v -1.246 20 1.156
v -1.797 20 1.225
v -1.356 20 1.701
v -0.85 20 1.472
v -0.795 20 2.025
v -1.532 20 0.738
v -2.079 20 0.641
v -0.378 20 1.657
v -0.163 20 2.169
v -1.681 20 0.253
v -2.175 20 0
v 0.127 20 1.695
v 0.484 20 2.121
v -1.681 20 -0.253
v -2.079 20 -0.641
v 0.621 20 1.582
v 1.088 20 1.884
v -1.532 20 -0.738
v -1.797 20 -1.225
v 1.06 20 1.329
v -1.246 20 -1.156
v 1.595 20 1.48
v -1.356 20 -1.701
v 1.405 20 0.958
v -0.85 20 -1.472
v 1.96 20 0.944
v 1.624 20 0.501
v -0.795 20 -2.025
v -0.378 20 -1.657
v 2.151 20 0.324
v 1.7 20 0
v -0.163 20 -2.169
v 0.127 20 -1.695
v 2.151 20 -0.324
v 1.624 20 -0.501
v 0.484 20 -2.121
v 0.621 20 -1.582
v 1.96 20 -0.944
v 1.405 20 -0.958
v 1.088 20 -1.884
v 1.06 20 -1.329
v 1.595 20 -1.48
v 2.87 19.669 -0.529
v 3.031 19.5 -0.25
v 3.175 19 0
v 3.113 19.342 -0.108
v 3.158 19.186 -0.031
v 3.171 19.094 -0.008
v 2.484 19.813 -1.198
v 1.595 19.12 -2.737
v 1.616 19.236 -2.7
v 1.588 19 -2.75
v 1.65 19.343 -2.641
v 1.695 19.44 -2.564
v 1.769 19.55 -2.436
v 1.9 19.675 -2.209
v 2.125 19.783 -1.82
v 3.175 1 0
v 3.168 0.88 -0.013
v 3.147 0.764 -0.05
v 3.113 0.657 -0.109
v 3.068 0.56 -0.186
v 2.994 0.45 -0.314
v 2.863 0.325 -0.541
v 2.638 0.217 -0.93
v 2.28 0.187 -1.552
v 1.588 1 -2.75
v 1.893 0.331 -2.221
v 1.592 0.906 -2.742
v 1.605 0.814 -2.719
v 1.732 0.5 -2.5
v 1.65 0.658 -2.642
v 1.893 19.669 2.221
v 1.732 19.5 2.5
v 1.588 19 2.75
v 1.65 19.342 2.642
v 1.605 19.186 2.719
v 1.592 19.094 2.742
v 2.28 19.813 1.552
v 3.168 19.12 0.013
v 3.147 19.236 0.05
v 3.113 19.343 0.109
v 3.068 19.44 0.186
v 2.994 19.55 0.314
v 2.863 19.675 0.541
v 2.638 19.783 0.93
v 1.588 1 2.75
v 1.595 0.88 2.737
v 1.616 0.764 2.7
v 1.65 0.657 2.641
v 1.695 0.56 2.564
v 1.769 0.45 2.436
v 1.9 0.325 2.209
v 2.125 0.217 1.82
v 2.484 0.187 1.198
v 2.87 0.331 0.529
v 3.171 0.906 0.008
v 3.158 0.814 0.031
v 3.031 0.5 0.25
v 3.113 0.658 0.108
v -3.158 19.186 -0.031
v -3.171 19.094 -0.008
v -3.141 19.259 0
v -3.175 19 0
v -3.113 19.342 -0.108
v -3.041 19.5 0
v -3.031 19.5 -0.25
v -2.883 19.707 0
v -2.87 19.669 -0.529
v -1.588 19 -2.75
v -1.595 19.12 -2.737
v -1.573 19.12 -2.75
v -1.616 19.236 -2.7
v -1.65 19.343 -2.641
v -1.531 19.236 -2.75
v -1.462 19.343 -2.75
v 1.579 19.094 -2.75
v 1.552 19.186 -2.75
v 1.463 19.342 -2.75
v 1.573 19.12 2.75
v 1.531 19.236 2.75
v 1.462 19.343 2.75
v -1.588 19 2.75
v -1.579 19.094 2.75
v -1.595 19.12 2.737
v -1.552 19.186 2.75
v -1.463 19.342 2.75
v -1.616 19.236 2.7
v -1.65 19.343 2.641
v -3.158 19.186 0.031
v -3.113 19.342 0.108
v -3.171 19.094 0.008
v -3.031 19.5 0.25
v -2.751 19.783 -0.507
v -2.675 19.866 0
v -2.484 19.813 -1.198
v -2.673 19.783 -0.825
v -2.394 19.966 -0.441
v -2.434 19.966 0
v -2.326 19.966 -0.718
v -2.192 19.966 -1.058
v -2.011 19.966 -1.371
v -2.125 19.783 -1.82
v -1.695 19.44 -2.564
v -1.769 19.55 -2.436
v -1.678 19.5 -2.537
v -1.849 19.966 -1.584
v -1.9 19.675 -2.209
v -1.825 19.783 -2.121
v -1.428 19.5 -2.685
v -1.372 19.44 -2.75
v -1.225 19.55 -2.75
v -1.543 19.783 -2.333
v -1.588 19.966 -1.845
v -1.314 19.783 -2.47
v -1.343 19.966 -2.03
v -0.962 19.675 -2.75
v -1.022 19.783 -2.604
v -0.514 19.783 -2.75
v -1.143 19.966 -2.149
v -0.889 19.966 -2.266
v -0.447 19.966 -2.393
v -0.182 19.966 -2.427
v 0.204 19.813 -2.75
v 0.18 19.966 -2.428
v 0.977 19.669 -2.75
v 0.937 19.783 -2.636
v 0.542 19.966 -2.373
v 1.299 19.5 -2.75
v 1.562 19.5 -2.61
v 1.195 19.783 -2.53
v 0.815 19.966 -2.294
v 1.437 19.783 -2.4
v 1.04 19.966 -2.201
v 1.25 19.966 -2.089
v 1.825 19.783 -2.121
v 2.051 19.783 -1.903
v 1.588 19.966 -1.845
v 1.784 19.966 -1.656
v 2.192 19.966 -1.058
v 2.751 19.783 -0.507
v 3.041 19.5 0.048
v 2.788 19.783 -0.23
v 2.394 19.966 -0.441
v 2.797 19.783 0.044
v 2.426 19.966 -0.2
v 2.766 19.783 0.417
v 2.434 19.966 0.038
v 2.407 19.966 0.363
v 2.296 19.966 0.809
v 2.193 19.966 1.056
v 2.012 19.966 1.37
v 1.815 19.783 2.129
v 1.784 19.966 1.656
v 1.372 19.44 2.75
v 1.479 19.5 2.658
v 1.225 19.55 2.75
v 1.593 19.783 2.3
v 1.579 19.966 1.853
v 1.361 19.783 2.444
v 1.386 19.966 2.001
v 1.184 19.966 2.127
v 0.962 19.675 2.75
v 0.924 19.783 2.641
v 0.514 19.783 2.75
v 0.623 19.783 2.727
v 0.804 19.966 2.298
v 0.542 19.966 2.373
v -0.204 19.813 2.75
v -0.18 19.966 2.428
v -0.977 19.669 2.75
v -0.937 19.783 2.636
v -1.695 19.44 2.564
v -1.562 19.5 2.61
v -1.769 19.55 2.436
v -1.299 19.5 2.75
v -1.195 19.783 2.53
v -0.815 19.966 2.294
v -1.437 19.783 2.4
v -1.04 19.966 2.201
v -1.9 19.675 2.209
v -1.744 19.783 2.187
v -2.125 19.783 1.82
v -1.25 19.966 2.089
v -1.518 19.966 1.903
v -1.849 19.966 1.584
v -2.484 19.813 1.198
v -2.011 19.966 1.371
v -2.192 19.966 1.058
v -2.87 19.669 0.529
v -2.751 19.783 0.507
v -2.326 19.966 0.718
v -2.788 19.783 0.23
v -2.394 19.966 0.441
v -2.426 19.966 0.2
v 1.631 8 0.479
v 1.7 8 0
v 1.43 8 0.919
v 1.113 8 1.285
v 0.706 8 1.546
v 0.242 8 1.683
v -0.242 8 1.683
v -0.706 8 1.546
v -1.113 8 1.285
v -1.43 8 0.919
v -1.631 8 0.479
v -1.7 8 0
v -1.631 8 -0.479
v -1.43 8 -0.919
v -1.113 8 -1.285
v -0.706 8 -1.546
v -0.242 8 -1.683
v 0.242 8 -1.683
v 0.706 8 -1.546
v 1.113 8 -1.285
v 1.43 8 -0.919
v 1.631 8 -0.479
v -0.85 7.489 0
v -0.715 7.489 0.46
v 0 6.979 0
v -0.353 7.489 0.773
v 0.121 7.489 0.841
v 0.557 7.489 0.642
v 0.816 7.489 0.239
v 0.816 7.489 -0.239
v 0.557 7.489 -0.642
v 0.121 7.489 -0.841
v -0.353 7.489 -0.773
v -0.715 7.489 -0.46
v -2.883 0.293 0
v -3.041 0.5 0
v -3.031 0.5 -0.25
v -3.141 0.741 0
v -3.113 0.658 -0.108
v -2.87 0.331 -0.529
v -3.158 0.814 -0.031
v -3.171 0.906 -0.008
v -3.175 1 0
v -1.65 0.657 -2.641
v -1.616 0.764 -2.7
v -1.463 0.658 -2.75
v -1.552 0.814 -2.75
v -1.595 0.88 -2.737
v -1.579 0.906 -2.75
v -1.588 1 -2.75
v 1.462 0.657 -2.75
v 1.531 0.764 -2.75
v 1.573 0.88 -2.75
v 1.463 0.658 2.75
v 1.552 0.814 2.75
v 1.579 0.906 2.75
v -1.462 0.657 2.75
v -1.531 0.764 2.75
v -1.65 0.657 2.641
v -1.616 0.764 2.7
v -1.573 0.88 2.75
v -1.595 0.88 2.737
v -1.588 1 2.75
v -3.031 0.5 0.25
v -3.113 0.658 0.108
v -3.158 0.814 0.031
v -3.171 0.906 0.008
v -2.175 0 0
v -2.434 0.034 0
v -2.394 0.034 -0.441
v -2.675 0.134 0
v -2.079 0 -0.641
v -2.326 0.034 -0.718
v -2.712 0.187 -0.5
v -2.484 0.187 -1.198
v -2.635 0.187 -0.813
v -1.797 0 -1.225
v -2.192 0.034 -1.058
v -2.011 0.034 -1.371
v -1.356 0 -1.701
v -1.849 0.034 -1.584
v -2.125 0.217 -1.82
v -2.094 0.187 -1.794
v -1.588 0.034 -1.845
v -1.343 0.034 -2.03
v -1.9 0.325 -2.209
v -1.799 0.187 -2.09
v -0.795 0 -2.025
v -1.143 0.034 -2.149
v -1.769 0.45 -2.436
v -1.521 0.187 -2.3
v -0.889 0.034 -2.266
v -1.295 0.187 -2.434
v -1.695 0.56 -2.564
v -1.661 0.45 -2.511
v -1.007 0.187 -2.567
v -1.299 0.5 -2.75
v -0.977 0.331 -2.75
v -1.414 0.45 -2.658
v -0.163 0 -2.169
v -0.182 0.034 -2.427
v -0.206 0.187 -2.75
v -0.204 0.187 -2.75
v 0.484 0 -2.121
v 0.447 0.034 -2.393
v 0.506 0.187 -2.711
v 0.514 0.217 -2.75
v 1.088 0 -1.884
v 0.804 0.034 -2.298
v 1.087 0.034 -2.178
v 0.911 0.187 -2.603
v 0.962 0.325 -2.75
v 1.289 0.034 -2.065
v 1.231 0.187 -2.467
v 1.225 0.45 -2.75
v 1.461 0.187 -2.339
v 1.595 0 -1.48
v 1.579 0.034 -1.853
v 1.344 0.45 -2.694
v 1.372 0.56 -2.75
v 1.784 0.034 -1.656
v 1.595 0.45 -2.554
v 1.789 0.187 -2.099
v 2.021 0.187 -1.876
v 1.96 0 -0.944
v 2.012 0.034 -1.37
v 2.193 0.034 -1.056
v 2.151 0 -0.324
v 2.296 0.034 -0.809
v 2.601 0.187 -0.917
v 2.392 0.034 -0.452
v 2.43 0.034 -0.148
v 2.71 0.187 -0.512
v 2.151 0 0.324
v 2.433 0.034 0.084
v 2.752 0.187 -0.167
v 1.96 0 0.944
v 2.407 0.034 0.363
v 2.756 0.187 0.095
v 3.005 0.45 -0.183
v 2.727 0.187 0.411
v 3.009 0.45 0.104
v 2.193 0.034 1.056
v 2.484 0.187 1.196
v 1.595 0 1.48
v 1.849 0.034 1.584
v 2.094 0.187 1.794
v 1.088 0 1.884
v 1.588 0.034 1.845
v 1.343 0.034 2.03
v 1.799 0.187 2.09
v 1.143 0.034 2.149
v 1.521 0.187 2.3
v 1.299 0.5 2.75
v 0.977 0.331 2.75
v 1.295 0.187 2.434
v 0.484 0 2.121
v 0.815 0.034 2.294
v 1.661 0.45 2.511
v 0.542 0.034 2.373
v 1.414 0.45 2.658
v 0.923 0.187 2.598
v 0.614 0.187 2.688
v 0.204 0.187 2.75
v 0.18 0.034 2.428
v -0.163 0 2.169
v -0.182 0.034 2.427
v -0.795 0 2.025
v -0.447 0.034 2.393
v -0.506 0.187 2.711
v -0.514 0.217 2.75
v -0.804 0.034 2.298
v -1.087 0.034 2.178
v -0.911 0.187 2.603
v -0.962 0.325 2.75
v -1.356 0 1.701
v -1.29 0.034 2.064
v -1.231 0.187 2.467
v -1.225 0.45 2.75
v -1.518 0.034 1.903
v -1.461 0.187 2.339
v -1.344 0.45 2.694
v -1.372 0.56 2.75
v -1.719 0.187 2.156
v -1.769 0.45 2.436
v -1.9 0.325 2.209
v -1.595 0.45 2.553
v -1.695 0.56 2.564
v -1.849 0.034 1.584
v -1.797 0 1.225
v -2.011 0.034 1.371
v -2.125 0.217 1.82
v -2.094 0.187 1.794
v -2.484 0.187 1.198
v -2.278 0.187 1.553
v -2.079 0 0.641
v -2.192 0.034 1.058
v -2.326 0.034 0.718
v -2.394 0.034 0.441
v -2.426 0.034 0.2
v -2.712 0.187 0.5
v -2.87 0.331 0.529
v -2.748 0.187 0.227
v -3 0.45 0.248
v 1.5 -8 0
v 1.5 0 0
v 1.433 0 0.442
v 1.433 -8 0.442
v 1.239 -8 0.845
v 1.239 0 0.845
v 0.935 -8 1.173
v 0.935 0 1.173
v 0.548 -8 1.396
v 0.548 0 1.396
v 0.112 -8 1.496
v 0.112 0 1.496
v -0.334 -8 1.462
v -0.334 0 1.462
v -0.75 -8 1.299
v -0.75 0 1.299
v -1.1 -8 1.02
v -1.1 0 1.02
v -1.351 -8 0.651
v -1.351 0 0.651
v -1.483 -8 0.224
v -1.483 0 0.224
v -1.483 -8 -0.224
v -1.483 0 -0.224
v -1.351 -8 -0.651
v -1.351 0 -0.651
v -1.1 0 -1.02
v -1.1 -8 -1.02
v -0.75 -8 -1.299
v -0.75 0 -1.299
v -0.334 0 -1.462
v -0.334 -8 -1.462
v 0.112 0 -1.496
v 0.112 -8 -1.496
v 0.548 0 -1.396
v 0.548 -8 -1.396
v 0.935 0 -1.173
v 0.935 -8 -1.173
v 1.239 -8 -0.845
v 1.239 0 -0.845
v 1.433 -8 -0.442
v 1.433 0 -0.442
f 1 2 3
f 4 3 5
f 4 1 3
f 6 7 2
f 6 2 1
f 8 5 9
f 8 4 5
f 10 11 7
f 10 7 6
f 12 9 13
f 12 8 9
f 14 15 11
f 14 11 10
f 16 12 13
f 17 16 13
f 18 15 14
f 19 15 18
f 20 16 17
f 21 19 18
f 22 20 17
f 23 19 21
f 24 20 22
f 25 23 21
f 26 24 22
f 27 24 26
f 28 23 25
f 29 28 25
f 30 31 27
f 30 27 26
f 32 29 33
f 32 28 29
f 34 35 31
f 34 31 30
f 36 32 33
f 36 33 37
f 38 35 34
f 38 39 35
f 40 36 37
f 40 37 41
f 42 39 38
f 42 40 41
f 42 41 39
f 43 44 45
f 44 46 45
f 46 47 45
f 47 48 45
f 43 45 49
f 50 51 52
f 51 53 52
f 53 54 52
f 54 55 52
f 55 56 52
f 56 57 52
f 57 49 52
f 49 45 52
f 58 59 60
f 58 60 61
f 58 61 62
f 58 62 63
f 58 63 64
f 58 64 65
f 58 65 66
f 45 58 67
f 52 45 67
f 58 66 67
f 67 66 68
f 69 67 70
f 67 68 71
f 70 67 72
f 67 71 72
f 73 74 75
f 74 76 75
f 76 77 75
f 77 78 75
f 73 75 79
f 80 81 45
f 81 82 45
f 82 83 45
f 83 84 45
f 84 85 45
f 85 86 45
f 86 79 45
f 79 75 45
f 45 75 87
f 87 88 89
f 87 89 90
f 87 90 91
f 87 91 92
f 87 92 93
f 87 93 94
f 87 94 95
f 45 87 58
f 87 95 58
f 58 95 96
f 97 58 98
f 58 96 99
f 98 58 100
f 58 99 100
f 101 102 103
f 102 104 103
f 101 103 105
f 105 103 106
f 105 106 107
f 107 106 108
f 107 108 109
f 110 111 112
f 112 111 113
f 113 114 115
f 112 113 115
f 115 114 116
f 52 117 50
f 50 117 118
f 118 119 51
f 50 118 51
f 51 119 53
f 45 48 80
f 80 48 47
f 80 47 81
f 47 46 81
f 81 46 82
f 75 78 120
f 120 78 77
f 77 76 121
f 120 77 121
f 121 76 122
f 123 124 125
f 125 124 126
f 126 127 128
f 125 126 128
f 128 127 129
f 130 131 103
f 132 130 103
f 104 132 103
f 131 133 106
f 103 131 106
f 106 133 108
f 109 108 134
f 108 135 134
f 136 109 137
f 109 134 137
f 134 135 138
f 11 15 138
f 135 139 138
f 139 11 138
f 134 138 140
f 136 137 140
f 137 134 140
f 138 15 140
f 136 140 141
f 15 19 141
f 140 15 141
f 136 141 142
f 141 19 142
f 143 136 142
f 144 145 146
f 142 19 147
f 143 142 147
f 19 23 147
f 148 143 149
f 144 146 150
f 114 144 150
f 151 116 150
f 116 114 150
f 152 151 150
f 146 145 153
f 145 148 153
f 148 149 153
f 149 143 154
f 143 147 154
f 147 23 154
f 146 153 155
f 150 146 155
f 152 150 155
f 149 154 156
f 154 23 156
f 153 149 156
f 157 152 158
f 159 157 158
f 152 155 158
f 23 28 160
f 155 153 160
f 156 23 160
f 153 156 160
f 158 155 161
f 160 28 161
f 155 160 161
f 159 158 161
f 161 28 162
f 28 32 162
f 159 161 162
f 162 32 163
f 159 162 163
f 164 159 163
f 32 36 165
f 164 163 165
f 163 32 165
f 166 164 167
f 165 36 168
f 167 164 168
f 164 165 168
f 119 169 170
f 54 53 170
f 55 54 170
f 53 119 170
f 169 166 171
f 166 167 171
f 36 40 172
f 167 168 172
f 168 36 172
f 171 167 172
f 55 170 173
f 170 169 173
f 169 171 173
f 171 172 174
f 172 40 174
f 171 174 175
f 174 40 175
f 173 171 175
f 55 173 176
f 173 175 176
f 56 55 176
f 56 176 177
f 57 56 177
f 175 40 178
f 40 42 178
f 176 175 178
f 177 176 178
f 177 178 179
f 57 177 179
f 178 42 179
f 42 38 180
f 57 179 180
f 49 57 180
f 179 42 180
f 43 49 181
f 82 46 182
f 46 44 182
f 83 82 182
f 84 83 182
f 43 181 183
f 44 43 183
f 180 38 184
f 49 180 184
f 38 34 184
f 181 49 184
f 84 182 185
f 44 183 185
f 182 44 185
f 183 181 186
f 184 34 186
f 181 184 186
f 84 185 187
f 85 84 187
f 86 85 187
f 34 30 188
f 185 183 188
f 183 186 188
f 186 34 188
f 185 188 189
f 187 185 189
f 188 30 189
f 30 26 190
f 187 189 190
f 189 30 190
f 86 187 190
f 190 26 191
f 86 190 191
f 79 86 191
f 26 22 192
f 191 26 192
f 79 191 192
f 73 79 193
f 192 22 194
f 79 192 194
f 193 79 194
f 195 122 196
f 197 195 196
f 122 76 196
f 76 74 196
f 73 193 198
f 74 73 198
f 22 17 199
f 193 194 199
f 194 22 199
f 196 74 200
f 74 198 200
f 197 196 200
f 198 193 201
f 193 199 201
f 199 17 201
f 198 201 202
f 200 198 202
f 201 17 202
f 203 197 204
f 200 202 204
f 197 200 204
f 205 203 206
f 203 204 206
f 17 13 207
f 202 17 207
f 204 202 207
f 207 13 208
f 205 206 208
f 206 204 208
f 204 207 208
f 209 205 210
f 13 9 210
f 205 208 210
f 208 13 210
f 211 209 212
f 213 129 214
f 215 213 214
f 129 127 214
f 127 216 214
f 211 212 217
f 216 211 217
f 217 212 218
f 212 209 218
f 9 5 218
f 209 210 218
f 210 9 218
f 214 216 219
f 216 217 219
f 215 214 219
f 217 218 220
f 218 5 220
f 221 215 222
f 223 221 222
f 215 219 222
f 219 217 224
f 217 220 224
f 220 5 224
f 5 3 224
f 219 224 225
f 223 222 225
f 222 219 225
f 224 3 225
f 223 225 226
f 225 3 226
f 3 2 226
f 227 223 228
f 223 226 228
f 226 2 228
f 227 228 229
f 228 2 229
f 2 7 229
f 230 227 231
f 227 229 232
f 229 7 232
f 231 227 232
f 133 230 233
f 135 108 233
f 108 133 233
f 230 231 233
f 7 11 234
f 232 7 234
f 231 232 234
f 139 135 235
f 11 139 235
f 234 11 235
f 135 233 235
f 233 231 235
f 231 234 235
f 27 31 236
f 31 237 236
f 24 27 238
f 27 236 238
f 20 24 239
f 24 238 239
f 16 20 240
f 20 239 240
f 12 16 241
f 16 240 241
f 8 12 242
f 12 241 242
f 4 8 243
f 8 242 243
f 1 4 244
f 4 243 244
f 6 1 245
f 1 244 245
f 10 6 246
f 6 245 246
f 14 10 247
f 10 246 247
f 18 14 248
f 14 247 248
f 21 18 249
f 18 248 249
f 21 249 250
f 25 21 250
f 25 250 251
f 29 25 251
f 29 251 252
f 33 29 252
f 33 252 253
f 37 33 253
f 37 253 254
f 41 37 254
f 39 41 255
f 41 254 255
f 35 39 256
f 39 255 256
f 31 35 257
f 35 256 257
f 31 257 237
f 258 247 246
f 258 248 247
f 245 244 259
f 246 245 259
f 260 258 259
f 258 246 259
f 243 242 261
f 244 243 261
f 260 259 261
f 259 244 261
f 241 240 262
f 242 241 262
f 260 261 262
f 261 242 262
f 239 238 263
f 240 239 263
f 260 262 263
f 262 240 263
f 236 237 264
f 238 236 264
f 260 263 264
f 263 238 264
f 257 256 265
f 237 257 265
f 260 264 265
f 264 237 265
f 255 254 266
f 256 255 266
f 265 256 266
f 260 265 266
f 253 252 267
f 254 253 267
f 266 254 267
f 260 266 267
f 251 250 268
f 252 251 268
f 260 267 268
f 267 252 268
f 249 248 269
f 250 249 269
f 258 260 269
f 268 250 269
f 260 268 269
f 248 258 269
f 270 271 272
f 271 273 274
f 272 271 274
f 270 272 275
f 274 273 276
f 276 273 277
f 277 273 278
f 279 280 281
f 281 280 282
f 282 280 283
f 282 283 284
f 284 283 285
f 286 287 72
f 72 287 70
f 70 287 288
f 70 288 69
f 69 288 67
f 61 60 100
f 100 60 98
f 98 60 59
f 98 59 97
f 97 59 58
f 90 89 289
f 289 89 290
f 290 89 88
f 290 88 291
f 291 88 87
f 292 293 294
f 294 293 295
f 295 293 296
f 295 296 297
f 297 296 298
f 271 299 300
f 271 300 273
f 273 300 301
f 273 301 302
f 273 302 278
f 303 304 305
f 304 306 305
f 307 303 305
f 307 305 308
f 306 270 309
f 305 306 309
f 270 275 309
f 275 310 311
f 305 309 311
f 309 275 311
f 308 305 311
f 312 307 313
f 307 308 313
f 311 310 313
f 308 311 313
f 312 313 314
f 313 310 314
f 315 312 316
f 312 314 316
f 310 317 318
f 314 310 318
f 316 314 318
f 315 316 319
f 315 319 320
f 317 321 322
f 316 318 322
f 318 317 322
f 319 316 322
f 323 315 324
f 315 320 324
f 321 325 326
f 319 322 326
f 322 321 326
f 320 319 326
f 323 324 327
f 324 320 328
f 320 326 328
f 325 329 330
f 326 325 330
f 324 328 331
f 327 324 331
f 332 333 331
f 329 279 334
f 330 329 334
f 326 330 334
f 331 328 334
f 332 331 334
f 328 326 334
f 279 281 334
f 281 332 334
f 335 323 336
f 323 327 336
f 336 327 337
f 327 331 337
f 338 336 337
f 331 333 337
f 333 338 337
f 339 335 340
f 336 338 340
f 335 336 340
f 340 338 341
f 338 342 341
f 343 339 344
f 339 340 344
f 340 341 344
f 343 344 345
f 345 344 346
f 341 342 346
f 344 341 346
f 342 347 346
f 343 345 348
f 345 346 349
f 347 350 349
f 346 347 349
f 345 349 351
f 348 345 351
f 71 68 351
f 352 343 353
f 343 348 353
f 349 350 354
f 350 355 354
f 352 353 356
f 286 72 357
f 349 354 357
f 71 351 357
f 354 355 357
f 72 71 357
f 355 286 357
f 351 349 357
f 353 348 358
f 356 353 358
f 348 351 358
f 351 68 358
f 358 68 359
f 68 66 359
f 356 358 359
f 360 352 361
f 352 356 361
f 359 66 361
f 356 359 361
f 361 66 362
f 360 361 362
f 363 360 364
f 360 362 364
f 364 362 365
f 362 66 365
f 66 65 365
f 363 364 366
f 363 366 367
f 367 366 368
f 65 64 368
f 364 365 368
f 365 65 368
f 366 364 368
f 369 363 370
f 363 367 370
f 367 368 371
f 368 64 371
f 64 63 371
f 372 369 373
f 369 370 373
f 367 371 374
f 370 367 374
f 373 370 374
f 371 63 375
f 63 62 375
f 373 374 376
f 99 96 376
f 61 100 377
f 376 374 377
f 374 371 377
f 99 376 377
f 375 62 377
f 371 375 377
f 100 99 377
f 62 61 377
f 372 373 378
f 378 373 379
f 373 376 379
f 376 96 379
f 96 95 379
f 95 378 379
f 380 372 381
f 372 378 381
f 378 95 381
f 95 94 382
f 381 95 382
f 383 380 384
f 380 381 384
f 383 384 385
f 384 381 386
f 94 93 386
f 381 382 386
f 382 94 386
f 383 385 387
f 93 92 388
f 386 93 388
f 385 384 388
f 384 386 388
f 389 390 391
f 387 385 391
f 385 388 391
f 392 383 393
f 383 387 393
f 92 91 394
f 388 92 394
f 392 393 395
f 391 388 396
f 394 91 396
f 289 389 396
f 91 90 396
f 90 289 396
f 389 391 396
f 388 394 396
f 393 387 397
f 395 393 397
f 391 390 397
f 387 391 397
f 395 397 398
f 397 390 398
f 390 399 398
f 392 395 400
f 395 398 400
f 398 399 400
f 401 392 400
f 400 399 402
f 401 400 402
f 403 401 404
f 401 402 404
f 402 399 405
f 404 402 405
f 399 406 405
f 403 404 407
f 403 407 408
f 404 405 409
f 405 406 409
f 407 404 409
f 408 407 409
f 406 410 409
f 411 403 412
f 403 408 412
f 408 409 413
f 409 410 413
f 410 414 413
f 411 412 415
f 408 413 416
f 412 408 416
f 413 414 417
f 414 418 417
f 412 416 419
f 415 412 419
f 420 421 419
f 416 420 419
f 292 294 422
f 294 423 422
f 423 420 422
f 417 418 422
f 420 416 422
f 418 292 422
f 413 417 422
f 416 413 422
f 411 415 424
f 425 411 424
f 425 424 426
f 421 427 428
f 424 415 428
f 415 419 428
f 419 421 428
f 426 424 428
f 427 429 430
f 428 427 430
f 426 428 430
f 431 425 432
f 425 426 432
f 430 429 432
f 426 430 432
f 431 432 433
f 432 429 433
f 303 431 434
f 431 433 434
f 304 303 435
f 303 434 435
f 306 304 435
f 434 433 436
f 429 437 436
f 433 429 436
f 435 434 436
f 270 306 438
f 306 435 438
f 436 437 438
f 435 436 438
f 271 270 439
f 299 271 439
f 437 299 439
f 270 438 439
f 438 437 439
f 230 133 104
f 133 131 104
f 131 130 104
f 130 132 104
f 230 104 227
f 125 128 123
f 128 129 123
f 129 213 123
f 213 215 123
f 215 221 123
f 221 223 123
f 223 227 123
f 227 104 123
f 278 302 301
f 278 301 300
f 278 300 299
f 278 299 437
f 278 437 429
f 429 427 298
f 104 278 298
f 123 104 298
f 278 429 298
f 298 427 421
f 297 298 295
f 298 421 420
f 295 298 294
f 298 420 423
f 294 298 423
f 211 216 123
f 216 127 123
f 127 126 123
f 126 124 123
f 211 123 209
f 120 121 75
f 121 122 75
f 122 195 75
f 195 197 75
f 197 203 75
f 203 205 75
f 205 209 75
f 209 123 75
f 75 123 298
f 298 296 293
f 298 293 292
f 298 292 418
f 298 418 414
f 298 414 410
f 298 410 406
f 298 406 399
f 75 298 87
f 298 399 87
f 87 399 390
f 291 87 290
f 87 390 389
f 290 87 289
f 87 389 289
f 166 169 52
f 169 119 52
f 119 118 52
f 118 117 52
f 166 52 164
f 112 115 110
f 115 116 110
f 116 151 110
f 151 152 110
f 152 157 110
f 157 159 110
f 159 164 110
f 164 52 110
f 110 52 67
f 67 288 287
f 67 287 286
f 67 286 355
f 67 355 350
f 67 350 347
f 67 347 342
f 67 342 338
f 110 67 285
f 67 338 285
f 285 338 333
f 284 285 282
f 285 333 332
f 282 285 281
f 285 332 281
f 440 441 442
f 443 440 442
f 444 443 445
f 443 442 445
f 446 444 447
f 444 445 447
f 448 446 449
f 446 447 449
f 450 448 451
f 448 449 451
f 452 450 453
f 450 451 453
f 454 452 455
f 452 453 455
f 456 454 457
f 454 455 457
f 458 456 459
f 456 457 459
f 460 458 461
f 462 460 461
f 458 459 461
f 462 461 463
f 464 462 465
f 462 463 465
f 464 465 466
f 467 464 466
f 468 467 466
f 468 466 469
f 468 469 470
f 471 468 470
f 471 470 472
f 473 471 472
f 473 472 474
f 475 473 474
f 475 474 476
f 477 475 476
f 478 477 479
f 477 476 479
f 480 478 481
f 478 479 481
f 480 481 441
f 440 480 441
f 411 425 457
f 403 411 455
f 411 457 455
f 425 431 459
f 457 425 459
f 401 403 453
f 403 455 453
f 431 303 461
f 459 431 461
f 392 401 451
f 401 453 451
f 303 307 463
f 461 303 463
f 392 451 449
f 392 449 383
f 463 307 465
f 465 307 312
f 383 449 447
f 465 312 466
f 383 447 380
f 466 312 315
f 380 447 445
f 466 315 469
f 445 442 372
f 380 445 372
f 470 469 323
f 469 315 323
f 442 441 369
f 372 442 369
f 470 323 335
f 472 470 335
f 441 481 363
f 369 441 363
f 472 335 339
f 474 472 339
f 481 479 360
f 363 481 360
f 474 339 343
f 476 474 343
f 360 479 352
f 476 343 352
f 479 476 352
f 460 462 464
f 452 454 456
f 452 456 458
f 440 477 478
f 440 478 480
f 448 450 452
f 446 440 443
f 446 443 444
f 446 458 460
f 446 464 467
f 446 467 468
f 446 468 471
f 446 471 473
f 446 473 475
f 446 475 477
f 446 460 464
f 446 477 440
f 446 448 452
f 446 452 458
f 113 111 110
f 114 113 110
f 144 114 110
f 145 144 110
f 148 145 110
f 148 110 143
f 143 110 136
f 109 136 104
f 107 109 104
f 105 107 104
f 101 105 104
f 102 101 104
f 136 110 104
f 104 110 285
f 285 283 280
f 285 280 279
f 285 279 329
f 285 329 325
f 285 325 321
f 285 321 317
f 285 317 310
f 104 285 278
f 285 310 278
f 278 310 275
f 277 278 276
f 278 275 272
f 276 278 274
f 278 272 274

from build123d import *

# Parameters (mm, degrees)
BOSS_EXTRUDE1_DEPTH      = 20
M3_CLEARANCE_HOLE1_D     = 3.4
M3_CLEARANCE_HOLE1_DEPTH = 12
M3_CLEARANCE_HOLE1_TIP   = 1.021463052
SKETCH5_R                = 1.5
BOSS_EXTRUDE2_DEPTH      = 8


with BuildPart() as part:
    # Sketch1 → Boss-Extrude1 (new body)
    with BuildSketch(Plane(origin=(0, 0, 0), x_dir=(1, 0, 0), z_dir=(0, 1, 0))):
        Polygon((3.175426481, 0), (1.58771324, 2.75), (-1.58771324, 2.75), (-3.175426481, 0), (-1.58771324, -2.75), (1.58771324, -2.75), align=None)
    extrude(amount=BOSS_EXTRUDE1_DEPTH)

    # M3 Clearance Hole1
    with Locations(Plane(origin=(0, 20, 0), x_dir=(-1, 0, 0), z_dir=(0, 1, 0))):
        with Locations((0, 0)):
            Hole(M3_CLEARANCE_HOLE1_D / 2, depth=M3_CLEARANCE_HOLE1_DEPTH)
            with Locations((0, 0, -(M3_CLEARANCE_HOLE1_DEPTH + M3_CLEARANCE_HOLE1_TIP / 2))):  # 118° drill point
                Cone(0, M3_CLEARANCE_HOLE1_D / 2, M3_CLEARANCE_HOLE1_TIP, mode=Mode.SUBTRACT)

    # Sketch4 → Cut-Revolve1 (revolve, cut)
    with BuildSketch(Plane.XY):
        with BuildLine():
            Line((-2.175426481, 20), (-3.175426481, 20))
            Line((-3.175426481, 20), (-3.175426481, 19))
            ThreePointArc((-3.175426481, 19), (-2.882533262, 19.707106781), (-2.175426481, 20))
        make_face()
        with BuildLine():
            Line((-3.175426481, 1), (-3.175426481, 0))
            Line((-3.175426481, 0), (-2.175426481, 0))
            ThreePointArc((-2.175426481, 0), (-2.882533262, 0.292893219), (-3.175426481, 1))
        make_face()
    revolve(axis=Axis((0, 20, 0), (0, -1, 0)), mode=Mode.SUBTRACT)

    # Sketch5 → Boss-Extrude2 (add)
    with BuildSketch(Plane.XZ):
        Circle(SKETCH5_R)
    extrude(amount=BOSS_EXTRUDE2_DEPTH)


solid = part.part
